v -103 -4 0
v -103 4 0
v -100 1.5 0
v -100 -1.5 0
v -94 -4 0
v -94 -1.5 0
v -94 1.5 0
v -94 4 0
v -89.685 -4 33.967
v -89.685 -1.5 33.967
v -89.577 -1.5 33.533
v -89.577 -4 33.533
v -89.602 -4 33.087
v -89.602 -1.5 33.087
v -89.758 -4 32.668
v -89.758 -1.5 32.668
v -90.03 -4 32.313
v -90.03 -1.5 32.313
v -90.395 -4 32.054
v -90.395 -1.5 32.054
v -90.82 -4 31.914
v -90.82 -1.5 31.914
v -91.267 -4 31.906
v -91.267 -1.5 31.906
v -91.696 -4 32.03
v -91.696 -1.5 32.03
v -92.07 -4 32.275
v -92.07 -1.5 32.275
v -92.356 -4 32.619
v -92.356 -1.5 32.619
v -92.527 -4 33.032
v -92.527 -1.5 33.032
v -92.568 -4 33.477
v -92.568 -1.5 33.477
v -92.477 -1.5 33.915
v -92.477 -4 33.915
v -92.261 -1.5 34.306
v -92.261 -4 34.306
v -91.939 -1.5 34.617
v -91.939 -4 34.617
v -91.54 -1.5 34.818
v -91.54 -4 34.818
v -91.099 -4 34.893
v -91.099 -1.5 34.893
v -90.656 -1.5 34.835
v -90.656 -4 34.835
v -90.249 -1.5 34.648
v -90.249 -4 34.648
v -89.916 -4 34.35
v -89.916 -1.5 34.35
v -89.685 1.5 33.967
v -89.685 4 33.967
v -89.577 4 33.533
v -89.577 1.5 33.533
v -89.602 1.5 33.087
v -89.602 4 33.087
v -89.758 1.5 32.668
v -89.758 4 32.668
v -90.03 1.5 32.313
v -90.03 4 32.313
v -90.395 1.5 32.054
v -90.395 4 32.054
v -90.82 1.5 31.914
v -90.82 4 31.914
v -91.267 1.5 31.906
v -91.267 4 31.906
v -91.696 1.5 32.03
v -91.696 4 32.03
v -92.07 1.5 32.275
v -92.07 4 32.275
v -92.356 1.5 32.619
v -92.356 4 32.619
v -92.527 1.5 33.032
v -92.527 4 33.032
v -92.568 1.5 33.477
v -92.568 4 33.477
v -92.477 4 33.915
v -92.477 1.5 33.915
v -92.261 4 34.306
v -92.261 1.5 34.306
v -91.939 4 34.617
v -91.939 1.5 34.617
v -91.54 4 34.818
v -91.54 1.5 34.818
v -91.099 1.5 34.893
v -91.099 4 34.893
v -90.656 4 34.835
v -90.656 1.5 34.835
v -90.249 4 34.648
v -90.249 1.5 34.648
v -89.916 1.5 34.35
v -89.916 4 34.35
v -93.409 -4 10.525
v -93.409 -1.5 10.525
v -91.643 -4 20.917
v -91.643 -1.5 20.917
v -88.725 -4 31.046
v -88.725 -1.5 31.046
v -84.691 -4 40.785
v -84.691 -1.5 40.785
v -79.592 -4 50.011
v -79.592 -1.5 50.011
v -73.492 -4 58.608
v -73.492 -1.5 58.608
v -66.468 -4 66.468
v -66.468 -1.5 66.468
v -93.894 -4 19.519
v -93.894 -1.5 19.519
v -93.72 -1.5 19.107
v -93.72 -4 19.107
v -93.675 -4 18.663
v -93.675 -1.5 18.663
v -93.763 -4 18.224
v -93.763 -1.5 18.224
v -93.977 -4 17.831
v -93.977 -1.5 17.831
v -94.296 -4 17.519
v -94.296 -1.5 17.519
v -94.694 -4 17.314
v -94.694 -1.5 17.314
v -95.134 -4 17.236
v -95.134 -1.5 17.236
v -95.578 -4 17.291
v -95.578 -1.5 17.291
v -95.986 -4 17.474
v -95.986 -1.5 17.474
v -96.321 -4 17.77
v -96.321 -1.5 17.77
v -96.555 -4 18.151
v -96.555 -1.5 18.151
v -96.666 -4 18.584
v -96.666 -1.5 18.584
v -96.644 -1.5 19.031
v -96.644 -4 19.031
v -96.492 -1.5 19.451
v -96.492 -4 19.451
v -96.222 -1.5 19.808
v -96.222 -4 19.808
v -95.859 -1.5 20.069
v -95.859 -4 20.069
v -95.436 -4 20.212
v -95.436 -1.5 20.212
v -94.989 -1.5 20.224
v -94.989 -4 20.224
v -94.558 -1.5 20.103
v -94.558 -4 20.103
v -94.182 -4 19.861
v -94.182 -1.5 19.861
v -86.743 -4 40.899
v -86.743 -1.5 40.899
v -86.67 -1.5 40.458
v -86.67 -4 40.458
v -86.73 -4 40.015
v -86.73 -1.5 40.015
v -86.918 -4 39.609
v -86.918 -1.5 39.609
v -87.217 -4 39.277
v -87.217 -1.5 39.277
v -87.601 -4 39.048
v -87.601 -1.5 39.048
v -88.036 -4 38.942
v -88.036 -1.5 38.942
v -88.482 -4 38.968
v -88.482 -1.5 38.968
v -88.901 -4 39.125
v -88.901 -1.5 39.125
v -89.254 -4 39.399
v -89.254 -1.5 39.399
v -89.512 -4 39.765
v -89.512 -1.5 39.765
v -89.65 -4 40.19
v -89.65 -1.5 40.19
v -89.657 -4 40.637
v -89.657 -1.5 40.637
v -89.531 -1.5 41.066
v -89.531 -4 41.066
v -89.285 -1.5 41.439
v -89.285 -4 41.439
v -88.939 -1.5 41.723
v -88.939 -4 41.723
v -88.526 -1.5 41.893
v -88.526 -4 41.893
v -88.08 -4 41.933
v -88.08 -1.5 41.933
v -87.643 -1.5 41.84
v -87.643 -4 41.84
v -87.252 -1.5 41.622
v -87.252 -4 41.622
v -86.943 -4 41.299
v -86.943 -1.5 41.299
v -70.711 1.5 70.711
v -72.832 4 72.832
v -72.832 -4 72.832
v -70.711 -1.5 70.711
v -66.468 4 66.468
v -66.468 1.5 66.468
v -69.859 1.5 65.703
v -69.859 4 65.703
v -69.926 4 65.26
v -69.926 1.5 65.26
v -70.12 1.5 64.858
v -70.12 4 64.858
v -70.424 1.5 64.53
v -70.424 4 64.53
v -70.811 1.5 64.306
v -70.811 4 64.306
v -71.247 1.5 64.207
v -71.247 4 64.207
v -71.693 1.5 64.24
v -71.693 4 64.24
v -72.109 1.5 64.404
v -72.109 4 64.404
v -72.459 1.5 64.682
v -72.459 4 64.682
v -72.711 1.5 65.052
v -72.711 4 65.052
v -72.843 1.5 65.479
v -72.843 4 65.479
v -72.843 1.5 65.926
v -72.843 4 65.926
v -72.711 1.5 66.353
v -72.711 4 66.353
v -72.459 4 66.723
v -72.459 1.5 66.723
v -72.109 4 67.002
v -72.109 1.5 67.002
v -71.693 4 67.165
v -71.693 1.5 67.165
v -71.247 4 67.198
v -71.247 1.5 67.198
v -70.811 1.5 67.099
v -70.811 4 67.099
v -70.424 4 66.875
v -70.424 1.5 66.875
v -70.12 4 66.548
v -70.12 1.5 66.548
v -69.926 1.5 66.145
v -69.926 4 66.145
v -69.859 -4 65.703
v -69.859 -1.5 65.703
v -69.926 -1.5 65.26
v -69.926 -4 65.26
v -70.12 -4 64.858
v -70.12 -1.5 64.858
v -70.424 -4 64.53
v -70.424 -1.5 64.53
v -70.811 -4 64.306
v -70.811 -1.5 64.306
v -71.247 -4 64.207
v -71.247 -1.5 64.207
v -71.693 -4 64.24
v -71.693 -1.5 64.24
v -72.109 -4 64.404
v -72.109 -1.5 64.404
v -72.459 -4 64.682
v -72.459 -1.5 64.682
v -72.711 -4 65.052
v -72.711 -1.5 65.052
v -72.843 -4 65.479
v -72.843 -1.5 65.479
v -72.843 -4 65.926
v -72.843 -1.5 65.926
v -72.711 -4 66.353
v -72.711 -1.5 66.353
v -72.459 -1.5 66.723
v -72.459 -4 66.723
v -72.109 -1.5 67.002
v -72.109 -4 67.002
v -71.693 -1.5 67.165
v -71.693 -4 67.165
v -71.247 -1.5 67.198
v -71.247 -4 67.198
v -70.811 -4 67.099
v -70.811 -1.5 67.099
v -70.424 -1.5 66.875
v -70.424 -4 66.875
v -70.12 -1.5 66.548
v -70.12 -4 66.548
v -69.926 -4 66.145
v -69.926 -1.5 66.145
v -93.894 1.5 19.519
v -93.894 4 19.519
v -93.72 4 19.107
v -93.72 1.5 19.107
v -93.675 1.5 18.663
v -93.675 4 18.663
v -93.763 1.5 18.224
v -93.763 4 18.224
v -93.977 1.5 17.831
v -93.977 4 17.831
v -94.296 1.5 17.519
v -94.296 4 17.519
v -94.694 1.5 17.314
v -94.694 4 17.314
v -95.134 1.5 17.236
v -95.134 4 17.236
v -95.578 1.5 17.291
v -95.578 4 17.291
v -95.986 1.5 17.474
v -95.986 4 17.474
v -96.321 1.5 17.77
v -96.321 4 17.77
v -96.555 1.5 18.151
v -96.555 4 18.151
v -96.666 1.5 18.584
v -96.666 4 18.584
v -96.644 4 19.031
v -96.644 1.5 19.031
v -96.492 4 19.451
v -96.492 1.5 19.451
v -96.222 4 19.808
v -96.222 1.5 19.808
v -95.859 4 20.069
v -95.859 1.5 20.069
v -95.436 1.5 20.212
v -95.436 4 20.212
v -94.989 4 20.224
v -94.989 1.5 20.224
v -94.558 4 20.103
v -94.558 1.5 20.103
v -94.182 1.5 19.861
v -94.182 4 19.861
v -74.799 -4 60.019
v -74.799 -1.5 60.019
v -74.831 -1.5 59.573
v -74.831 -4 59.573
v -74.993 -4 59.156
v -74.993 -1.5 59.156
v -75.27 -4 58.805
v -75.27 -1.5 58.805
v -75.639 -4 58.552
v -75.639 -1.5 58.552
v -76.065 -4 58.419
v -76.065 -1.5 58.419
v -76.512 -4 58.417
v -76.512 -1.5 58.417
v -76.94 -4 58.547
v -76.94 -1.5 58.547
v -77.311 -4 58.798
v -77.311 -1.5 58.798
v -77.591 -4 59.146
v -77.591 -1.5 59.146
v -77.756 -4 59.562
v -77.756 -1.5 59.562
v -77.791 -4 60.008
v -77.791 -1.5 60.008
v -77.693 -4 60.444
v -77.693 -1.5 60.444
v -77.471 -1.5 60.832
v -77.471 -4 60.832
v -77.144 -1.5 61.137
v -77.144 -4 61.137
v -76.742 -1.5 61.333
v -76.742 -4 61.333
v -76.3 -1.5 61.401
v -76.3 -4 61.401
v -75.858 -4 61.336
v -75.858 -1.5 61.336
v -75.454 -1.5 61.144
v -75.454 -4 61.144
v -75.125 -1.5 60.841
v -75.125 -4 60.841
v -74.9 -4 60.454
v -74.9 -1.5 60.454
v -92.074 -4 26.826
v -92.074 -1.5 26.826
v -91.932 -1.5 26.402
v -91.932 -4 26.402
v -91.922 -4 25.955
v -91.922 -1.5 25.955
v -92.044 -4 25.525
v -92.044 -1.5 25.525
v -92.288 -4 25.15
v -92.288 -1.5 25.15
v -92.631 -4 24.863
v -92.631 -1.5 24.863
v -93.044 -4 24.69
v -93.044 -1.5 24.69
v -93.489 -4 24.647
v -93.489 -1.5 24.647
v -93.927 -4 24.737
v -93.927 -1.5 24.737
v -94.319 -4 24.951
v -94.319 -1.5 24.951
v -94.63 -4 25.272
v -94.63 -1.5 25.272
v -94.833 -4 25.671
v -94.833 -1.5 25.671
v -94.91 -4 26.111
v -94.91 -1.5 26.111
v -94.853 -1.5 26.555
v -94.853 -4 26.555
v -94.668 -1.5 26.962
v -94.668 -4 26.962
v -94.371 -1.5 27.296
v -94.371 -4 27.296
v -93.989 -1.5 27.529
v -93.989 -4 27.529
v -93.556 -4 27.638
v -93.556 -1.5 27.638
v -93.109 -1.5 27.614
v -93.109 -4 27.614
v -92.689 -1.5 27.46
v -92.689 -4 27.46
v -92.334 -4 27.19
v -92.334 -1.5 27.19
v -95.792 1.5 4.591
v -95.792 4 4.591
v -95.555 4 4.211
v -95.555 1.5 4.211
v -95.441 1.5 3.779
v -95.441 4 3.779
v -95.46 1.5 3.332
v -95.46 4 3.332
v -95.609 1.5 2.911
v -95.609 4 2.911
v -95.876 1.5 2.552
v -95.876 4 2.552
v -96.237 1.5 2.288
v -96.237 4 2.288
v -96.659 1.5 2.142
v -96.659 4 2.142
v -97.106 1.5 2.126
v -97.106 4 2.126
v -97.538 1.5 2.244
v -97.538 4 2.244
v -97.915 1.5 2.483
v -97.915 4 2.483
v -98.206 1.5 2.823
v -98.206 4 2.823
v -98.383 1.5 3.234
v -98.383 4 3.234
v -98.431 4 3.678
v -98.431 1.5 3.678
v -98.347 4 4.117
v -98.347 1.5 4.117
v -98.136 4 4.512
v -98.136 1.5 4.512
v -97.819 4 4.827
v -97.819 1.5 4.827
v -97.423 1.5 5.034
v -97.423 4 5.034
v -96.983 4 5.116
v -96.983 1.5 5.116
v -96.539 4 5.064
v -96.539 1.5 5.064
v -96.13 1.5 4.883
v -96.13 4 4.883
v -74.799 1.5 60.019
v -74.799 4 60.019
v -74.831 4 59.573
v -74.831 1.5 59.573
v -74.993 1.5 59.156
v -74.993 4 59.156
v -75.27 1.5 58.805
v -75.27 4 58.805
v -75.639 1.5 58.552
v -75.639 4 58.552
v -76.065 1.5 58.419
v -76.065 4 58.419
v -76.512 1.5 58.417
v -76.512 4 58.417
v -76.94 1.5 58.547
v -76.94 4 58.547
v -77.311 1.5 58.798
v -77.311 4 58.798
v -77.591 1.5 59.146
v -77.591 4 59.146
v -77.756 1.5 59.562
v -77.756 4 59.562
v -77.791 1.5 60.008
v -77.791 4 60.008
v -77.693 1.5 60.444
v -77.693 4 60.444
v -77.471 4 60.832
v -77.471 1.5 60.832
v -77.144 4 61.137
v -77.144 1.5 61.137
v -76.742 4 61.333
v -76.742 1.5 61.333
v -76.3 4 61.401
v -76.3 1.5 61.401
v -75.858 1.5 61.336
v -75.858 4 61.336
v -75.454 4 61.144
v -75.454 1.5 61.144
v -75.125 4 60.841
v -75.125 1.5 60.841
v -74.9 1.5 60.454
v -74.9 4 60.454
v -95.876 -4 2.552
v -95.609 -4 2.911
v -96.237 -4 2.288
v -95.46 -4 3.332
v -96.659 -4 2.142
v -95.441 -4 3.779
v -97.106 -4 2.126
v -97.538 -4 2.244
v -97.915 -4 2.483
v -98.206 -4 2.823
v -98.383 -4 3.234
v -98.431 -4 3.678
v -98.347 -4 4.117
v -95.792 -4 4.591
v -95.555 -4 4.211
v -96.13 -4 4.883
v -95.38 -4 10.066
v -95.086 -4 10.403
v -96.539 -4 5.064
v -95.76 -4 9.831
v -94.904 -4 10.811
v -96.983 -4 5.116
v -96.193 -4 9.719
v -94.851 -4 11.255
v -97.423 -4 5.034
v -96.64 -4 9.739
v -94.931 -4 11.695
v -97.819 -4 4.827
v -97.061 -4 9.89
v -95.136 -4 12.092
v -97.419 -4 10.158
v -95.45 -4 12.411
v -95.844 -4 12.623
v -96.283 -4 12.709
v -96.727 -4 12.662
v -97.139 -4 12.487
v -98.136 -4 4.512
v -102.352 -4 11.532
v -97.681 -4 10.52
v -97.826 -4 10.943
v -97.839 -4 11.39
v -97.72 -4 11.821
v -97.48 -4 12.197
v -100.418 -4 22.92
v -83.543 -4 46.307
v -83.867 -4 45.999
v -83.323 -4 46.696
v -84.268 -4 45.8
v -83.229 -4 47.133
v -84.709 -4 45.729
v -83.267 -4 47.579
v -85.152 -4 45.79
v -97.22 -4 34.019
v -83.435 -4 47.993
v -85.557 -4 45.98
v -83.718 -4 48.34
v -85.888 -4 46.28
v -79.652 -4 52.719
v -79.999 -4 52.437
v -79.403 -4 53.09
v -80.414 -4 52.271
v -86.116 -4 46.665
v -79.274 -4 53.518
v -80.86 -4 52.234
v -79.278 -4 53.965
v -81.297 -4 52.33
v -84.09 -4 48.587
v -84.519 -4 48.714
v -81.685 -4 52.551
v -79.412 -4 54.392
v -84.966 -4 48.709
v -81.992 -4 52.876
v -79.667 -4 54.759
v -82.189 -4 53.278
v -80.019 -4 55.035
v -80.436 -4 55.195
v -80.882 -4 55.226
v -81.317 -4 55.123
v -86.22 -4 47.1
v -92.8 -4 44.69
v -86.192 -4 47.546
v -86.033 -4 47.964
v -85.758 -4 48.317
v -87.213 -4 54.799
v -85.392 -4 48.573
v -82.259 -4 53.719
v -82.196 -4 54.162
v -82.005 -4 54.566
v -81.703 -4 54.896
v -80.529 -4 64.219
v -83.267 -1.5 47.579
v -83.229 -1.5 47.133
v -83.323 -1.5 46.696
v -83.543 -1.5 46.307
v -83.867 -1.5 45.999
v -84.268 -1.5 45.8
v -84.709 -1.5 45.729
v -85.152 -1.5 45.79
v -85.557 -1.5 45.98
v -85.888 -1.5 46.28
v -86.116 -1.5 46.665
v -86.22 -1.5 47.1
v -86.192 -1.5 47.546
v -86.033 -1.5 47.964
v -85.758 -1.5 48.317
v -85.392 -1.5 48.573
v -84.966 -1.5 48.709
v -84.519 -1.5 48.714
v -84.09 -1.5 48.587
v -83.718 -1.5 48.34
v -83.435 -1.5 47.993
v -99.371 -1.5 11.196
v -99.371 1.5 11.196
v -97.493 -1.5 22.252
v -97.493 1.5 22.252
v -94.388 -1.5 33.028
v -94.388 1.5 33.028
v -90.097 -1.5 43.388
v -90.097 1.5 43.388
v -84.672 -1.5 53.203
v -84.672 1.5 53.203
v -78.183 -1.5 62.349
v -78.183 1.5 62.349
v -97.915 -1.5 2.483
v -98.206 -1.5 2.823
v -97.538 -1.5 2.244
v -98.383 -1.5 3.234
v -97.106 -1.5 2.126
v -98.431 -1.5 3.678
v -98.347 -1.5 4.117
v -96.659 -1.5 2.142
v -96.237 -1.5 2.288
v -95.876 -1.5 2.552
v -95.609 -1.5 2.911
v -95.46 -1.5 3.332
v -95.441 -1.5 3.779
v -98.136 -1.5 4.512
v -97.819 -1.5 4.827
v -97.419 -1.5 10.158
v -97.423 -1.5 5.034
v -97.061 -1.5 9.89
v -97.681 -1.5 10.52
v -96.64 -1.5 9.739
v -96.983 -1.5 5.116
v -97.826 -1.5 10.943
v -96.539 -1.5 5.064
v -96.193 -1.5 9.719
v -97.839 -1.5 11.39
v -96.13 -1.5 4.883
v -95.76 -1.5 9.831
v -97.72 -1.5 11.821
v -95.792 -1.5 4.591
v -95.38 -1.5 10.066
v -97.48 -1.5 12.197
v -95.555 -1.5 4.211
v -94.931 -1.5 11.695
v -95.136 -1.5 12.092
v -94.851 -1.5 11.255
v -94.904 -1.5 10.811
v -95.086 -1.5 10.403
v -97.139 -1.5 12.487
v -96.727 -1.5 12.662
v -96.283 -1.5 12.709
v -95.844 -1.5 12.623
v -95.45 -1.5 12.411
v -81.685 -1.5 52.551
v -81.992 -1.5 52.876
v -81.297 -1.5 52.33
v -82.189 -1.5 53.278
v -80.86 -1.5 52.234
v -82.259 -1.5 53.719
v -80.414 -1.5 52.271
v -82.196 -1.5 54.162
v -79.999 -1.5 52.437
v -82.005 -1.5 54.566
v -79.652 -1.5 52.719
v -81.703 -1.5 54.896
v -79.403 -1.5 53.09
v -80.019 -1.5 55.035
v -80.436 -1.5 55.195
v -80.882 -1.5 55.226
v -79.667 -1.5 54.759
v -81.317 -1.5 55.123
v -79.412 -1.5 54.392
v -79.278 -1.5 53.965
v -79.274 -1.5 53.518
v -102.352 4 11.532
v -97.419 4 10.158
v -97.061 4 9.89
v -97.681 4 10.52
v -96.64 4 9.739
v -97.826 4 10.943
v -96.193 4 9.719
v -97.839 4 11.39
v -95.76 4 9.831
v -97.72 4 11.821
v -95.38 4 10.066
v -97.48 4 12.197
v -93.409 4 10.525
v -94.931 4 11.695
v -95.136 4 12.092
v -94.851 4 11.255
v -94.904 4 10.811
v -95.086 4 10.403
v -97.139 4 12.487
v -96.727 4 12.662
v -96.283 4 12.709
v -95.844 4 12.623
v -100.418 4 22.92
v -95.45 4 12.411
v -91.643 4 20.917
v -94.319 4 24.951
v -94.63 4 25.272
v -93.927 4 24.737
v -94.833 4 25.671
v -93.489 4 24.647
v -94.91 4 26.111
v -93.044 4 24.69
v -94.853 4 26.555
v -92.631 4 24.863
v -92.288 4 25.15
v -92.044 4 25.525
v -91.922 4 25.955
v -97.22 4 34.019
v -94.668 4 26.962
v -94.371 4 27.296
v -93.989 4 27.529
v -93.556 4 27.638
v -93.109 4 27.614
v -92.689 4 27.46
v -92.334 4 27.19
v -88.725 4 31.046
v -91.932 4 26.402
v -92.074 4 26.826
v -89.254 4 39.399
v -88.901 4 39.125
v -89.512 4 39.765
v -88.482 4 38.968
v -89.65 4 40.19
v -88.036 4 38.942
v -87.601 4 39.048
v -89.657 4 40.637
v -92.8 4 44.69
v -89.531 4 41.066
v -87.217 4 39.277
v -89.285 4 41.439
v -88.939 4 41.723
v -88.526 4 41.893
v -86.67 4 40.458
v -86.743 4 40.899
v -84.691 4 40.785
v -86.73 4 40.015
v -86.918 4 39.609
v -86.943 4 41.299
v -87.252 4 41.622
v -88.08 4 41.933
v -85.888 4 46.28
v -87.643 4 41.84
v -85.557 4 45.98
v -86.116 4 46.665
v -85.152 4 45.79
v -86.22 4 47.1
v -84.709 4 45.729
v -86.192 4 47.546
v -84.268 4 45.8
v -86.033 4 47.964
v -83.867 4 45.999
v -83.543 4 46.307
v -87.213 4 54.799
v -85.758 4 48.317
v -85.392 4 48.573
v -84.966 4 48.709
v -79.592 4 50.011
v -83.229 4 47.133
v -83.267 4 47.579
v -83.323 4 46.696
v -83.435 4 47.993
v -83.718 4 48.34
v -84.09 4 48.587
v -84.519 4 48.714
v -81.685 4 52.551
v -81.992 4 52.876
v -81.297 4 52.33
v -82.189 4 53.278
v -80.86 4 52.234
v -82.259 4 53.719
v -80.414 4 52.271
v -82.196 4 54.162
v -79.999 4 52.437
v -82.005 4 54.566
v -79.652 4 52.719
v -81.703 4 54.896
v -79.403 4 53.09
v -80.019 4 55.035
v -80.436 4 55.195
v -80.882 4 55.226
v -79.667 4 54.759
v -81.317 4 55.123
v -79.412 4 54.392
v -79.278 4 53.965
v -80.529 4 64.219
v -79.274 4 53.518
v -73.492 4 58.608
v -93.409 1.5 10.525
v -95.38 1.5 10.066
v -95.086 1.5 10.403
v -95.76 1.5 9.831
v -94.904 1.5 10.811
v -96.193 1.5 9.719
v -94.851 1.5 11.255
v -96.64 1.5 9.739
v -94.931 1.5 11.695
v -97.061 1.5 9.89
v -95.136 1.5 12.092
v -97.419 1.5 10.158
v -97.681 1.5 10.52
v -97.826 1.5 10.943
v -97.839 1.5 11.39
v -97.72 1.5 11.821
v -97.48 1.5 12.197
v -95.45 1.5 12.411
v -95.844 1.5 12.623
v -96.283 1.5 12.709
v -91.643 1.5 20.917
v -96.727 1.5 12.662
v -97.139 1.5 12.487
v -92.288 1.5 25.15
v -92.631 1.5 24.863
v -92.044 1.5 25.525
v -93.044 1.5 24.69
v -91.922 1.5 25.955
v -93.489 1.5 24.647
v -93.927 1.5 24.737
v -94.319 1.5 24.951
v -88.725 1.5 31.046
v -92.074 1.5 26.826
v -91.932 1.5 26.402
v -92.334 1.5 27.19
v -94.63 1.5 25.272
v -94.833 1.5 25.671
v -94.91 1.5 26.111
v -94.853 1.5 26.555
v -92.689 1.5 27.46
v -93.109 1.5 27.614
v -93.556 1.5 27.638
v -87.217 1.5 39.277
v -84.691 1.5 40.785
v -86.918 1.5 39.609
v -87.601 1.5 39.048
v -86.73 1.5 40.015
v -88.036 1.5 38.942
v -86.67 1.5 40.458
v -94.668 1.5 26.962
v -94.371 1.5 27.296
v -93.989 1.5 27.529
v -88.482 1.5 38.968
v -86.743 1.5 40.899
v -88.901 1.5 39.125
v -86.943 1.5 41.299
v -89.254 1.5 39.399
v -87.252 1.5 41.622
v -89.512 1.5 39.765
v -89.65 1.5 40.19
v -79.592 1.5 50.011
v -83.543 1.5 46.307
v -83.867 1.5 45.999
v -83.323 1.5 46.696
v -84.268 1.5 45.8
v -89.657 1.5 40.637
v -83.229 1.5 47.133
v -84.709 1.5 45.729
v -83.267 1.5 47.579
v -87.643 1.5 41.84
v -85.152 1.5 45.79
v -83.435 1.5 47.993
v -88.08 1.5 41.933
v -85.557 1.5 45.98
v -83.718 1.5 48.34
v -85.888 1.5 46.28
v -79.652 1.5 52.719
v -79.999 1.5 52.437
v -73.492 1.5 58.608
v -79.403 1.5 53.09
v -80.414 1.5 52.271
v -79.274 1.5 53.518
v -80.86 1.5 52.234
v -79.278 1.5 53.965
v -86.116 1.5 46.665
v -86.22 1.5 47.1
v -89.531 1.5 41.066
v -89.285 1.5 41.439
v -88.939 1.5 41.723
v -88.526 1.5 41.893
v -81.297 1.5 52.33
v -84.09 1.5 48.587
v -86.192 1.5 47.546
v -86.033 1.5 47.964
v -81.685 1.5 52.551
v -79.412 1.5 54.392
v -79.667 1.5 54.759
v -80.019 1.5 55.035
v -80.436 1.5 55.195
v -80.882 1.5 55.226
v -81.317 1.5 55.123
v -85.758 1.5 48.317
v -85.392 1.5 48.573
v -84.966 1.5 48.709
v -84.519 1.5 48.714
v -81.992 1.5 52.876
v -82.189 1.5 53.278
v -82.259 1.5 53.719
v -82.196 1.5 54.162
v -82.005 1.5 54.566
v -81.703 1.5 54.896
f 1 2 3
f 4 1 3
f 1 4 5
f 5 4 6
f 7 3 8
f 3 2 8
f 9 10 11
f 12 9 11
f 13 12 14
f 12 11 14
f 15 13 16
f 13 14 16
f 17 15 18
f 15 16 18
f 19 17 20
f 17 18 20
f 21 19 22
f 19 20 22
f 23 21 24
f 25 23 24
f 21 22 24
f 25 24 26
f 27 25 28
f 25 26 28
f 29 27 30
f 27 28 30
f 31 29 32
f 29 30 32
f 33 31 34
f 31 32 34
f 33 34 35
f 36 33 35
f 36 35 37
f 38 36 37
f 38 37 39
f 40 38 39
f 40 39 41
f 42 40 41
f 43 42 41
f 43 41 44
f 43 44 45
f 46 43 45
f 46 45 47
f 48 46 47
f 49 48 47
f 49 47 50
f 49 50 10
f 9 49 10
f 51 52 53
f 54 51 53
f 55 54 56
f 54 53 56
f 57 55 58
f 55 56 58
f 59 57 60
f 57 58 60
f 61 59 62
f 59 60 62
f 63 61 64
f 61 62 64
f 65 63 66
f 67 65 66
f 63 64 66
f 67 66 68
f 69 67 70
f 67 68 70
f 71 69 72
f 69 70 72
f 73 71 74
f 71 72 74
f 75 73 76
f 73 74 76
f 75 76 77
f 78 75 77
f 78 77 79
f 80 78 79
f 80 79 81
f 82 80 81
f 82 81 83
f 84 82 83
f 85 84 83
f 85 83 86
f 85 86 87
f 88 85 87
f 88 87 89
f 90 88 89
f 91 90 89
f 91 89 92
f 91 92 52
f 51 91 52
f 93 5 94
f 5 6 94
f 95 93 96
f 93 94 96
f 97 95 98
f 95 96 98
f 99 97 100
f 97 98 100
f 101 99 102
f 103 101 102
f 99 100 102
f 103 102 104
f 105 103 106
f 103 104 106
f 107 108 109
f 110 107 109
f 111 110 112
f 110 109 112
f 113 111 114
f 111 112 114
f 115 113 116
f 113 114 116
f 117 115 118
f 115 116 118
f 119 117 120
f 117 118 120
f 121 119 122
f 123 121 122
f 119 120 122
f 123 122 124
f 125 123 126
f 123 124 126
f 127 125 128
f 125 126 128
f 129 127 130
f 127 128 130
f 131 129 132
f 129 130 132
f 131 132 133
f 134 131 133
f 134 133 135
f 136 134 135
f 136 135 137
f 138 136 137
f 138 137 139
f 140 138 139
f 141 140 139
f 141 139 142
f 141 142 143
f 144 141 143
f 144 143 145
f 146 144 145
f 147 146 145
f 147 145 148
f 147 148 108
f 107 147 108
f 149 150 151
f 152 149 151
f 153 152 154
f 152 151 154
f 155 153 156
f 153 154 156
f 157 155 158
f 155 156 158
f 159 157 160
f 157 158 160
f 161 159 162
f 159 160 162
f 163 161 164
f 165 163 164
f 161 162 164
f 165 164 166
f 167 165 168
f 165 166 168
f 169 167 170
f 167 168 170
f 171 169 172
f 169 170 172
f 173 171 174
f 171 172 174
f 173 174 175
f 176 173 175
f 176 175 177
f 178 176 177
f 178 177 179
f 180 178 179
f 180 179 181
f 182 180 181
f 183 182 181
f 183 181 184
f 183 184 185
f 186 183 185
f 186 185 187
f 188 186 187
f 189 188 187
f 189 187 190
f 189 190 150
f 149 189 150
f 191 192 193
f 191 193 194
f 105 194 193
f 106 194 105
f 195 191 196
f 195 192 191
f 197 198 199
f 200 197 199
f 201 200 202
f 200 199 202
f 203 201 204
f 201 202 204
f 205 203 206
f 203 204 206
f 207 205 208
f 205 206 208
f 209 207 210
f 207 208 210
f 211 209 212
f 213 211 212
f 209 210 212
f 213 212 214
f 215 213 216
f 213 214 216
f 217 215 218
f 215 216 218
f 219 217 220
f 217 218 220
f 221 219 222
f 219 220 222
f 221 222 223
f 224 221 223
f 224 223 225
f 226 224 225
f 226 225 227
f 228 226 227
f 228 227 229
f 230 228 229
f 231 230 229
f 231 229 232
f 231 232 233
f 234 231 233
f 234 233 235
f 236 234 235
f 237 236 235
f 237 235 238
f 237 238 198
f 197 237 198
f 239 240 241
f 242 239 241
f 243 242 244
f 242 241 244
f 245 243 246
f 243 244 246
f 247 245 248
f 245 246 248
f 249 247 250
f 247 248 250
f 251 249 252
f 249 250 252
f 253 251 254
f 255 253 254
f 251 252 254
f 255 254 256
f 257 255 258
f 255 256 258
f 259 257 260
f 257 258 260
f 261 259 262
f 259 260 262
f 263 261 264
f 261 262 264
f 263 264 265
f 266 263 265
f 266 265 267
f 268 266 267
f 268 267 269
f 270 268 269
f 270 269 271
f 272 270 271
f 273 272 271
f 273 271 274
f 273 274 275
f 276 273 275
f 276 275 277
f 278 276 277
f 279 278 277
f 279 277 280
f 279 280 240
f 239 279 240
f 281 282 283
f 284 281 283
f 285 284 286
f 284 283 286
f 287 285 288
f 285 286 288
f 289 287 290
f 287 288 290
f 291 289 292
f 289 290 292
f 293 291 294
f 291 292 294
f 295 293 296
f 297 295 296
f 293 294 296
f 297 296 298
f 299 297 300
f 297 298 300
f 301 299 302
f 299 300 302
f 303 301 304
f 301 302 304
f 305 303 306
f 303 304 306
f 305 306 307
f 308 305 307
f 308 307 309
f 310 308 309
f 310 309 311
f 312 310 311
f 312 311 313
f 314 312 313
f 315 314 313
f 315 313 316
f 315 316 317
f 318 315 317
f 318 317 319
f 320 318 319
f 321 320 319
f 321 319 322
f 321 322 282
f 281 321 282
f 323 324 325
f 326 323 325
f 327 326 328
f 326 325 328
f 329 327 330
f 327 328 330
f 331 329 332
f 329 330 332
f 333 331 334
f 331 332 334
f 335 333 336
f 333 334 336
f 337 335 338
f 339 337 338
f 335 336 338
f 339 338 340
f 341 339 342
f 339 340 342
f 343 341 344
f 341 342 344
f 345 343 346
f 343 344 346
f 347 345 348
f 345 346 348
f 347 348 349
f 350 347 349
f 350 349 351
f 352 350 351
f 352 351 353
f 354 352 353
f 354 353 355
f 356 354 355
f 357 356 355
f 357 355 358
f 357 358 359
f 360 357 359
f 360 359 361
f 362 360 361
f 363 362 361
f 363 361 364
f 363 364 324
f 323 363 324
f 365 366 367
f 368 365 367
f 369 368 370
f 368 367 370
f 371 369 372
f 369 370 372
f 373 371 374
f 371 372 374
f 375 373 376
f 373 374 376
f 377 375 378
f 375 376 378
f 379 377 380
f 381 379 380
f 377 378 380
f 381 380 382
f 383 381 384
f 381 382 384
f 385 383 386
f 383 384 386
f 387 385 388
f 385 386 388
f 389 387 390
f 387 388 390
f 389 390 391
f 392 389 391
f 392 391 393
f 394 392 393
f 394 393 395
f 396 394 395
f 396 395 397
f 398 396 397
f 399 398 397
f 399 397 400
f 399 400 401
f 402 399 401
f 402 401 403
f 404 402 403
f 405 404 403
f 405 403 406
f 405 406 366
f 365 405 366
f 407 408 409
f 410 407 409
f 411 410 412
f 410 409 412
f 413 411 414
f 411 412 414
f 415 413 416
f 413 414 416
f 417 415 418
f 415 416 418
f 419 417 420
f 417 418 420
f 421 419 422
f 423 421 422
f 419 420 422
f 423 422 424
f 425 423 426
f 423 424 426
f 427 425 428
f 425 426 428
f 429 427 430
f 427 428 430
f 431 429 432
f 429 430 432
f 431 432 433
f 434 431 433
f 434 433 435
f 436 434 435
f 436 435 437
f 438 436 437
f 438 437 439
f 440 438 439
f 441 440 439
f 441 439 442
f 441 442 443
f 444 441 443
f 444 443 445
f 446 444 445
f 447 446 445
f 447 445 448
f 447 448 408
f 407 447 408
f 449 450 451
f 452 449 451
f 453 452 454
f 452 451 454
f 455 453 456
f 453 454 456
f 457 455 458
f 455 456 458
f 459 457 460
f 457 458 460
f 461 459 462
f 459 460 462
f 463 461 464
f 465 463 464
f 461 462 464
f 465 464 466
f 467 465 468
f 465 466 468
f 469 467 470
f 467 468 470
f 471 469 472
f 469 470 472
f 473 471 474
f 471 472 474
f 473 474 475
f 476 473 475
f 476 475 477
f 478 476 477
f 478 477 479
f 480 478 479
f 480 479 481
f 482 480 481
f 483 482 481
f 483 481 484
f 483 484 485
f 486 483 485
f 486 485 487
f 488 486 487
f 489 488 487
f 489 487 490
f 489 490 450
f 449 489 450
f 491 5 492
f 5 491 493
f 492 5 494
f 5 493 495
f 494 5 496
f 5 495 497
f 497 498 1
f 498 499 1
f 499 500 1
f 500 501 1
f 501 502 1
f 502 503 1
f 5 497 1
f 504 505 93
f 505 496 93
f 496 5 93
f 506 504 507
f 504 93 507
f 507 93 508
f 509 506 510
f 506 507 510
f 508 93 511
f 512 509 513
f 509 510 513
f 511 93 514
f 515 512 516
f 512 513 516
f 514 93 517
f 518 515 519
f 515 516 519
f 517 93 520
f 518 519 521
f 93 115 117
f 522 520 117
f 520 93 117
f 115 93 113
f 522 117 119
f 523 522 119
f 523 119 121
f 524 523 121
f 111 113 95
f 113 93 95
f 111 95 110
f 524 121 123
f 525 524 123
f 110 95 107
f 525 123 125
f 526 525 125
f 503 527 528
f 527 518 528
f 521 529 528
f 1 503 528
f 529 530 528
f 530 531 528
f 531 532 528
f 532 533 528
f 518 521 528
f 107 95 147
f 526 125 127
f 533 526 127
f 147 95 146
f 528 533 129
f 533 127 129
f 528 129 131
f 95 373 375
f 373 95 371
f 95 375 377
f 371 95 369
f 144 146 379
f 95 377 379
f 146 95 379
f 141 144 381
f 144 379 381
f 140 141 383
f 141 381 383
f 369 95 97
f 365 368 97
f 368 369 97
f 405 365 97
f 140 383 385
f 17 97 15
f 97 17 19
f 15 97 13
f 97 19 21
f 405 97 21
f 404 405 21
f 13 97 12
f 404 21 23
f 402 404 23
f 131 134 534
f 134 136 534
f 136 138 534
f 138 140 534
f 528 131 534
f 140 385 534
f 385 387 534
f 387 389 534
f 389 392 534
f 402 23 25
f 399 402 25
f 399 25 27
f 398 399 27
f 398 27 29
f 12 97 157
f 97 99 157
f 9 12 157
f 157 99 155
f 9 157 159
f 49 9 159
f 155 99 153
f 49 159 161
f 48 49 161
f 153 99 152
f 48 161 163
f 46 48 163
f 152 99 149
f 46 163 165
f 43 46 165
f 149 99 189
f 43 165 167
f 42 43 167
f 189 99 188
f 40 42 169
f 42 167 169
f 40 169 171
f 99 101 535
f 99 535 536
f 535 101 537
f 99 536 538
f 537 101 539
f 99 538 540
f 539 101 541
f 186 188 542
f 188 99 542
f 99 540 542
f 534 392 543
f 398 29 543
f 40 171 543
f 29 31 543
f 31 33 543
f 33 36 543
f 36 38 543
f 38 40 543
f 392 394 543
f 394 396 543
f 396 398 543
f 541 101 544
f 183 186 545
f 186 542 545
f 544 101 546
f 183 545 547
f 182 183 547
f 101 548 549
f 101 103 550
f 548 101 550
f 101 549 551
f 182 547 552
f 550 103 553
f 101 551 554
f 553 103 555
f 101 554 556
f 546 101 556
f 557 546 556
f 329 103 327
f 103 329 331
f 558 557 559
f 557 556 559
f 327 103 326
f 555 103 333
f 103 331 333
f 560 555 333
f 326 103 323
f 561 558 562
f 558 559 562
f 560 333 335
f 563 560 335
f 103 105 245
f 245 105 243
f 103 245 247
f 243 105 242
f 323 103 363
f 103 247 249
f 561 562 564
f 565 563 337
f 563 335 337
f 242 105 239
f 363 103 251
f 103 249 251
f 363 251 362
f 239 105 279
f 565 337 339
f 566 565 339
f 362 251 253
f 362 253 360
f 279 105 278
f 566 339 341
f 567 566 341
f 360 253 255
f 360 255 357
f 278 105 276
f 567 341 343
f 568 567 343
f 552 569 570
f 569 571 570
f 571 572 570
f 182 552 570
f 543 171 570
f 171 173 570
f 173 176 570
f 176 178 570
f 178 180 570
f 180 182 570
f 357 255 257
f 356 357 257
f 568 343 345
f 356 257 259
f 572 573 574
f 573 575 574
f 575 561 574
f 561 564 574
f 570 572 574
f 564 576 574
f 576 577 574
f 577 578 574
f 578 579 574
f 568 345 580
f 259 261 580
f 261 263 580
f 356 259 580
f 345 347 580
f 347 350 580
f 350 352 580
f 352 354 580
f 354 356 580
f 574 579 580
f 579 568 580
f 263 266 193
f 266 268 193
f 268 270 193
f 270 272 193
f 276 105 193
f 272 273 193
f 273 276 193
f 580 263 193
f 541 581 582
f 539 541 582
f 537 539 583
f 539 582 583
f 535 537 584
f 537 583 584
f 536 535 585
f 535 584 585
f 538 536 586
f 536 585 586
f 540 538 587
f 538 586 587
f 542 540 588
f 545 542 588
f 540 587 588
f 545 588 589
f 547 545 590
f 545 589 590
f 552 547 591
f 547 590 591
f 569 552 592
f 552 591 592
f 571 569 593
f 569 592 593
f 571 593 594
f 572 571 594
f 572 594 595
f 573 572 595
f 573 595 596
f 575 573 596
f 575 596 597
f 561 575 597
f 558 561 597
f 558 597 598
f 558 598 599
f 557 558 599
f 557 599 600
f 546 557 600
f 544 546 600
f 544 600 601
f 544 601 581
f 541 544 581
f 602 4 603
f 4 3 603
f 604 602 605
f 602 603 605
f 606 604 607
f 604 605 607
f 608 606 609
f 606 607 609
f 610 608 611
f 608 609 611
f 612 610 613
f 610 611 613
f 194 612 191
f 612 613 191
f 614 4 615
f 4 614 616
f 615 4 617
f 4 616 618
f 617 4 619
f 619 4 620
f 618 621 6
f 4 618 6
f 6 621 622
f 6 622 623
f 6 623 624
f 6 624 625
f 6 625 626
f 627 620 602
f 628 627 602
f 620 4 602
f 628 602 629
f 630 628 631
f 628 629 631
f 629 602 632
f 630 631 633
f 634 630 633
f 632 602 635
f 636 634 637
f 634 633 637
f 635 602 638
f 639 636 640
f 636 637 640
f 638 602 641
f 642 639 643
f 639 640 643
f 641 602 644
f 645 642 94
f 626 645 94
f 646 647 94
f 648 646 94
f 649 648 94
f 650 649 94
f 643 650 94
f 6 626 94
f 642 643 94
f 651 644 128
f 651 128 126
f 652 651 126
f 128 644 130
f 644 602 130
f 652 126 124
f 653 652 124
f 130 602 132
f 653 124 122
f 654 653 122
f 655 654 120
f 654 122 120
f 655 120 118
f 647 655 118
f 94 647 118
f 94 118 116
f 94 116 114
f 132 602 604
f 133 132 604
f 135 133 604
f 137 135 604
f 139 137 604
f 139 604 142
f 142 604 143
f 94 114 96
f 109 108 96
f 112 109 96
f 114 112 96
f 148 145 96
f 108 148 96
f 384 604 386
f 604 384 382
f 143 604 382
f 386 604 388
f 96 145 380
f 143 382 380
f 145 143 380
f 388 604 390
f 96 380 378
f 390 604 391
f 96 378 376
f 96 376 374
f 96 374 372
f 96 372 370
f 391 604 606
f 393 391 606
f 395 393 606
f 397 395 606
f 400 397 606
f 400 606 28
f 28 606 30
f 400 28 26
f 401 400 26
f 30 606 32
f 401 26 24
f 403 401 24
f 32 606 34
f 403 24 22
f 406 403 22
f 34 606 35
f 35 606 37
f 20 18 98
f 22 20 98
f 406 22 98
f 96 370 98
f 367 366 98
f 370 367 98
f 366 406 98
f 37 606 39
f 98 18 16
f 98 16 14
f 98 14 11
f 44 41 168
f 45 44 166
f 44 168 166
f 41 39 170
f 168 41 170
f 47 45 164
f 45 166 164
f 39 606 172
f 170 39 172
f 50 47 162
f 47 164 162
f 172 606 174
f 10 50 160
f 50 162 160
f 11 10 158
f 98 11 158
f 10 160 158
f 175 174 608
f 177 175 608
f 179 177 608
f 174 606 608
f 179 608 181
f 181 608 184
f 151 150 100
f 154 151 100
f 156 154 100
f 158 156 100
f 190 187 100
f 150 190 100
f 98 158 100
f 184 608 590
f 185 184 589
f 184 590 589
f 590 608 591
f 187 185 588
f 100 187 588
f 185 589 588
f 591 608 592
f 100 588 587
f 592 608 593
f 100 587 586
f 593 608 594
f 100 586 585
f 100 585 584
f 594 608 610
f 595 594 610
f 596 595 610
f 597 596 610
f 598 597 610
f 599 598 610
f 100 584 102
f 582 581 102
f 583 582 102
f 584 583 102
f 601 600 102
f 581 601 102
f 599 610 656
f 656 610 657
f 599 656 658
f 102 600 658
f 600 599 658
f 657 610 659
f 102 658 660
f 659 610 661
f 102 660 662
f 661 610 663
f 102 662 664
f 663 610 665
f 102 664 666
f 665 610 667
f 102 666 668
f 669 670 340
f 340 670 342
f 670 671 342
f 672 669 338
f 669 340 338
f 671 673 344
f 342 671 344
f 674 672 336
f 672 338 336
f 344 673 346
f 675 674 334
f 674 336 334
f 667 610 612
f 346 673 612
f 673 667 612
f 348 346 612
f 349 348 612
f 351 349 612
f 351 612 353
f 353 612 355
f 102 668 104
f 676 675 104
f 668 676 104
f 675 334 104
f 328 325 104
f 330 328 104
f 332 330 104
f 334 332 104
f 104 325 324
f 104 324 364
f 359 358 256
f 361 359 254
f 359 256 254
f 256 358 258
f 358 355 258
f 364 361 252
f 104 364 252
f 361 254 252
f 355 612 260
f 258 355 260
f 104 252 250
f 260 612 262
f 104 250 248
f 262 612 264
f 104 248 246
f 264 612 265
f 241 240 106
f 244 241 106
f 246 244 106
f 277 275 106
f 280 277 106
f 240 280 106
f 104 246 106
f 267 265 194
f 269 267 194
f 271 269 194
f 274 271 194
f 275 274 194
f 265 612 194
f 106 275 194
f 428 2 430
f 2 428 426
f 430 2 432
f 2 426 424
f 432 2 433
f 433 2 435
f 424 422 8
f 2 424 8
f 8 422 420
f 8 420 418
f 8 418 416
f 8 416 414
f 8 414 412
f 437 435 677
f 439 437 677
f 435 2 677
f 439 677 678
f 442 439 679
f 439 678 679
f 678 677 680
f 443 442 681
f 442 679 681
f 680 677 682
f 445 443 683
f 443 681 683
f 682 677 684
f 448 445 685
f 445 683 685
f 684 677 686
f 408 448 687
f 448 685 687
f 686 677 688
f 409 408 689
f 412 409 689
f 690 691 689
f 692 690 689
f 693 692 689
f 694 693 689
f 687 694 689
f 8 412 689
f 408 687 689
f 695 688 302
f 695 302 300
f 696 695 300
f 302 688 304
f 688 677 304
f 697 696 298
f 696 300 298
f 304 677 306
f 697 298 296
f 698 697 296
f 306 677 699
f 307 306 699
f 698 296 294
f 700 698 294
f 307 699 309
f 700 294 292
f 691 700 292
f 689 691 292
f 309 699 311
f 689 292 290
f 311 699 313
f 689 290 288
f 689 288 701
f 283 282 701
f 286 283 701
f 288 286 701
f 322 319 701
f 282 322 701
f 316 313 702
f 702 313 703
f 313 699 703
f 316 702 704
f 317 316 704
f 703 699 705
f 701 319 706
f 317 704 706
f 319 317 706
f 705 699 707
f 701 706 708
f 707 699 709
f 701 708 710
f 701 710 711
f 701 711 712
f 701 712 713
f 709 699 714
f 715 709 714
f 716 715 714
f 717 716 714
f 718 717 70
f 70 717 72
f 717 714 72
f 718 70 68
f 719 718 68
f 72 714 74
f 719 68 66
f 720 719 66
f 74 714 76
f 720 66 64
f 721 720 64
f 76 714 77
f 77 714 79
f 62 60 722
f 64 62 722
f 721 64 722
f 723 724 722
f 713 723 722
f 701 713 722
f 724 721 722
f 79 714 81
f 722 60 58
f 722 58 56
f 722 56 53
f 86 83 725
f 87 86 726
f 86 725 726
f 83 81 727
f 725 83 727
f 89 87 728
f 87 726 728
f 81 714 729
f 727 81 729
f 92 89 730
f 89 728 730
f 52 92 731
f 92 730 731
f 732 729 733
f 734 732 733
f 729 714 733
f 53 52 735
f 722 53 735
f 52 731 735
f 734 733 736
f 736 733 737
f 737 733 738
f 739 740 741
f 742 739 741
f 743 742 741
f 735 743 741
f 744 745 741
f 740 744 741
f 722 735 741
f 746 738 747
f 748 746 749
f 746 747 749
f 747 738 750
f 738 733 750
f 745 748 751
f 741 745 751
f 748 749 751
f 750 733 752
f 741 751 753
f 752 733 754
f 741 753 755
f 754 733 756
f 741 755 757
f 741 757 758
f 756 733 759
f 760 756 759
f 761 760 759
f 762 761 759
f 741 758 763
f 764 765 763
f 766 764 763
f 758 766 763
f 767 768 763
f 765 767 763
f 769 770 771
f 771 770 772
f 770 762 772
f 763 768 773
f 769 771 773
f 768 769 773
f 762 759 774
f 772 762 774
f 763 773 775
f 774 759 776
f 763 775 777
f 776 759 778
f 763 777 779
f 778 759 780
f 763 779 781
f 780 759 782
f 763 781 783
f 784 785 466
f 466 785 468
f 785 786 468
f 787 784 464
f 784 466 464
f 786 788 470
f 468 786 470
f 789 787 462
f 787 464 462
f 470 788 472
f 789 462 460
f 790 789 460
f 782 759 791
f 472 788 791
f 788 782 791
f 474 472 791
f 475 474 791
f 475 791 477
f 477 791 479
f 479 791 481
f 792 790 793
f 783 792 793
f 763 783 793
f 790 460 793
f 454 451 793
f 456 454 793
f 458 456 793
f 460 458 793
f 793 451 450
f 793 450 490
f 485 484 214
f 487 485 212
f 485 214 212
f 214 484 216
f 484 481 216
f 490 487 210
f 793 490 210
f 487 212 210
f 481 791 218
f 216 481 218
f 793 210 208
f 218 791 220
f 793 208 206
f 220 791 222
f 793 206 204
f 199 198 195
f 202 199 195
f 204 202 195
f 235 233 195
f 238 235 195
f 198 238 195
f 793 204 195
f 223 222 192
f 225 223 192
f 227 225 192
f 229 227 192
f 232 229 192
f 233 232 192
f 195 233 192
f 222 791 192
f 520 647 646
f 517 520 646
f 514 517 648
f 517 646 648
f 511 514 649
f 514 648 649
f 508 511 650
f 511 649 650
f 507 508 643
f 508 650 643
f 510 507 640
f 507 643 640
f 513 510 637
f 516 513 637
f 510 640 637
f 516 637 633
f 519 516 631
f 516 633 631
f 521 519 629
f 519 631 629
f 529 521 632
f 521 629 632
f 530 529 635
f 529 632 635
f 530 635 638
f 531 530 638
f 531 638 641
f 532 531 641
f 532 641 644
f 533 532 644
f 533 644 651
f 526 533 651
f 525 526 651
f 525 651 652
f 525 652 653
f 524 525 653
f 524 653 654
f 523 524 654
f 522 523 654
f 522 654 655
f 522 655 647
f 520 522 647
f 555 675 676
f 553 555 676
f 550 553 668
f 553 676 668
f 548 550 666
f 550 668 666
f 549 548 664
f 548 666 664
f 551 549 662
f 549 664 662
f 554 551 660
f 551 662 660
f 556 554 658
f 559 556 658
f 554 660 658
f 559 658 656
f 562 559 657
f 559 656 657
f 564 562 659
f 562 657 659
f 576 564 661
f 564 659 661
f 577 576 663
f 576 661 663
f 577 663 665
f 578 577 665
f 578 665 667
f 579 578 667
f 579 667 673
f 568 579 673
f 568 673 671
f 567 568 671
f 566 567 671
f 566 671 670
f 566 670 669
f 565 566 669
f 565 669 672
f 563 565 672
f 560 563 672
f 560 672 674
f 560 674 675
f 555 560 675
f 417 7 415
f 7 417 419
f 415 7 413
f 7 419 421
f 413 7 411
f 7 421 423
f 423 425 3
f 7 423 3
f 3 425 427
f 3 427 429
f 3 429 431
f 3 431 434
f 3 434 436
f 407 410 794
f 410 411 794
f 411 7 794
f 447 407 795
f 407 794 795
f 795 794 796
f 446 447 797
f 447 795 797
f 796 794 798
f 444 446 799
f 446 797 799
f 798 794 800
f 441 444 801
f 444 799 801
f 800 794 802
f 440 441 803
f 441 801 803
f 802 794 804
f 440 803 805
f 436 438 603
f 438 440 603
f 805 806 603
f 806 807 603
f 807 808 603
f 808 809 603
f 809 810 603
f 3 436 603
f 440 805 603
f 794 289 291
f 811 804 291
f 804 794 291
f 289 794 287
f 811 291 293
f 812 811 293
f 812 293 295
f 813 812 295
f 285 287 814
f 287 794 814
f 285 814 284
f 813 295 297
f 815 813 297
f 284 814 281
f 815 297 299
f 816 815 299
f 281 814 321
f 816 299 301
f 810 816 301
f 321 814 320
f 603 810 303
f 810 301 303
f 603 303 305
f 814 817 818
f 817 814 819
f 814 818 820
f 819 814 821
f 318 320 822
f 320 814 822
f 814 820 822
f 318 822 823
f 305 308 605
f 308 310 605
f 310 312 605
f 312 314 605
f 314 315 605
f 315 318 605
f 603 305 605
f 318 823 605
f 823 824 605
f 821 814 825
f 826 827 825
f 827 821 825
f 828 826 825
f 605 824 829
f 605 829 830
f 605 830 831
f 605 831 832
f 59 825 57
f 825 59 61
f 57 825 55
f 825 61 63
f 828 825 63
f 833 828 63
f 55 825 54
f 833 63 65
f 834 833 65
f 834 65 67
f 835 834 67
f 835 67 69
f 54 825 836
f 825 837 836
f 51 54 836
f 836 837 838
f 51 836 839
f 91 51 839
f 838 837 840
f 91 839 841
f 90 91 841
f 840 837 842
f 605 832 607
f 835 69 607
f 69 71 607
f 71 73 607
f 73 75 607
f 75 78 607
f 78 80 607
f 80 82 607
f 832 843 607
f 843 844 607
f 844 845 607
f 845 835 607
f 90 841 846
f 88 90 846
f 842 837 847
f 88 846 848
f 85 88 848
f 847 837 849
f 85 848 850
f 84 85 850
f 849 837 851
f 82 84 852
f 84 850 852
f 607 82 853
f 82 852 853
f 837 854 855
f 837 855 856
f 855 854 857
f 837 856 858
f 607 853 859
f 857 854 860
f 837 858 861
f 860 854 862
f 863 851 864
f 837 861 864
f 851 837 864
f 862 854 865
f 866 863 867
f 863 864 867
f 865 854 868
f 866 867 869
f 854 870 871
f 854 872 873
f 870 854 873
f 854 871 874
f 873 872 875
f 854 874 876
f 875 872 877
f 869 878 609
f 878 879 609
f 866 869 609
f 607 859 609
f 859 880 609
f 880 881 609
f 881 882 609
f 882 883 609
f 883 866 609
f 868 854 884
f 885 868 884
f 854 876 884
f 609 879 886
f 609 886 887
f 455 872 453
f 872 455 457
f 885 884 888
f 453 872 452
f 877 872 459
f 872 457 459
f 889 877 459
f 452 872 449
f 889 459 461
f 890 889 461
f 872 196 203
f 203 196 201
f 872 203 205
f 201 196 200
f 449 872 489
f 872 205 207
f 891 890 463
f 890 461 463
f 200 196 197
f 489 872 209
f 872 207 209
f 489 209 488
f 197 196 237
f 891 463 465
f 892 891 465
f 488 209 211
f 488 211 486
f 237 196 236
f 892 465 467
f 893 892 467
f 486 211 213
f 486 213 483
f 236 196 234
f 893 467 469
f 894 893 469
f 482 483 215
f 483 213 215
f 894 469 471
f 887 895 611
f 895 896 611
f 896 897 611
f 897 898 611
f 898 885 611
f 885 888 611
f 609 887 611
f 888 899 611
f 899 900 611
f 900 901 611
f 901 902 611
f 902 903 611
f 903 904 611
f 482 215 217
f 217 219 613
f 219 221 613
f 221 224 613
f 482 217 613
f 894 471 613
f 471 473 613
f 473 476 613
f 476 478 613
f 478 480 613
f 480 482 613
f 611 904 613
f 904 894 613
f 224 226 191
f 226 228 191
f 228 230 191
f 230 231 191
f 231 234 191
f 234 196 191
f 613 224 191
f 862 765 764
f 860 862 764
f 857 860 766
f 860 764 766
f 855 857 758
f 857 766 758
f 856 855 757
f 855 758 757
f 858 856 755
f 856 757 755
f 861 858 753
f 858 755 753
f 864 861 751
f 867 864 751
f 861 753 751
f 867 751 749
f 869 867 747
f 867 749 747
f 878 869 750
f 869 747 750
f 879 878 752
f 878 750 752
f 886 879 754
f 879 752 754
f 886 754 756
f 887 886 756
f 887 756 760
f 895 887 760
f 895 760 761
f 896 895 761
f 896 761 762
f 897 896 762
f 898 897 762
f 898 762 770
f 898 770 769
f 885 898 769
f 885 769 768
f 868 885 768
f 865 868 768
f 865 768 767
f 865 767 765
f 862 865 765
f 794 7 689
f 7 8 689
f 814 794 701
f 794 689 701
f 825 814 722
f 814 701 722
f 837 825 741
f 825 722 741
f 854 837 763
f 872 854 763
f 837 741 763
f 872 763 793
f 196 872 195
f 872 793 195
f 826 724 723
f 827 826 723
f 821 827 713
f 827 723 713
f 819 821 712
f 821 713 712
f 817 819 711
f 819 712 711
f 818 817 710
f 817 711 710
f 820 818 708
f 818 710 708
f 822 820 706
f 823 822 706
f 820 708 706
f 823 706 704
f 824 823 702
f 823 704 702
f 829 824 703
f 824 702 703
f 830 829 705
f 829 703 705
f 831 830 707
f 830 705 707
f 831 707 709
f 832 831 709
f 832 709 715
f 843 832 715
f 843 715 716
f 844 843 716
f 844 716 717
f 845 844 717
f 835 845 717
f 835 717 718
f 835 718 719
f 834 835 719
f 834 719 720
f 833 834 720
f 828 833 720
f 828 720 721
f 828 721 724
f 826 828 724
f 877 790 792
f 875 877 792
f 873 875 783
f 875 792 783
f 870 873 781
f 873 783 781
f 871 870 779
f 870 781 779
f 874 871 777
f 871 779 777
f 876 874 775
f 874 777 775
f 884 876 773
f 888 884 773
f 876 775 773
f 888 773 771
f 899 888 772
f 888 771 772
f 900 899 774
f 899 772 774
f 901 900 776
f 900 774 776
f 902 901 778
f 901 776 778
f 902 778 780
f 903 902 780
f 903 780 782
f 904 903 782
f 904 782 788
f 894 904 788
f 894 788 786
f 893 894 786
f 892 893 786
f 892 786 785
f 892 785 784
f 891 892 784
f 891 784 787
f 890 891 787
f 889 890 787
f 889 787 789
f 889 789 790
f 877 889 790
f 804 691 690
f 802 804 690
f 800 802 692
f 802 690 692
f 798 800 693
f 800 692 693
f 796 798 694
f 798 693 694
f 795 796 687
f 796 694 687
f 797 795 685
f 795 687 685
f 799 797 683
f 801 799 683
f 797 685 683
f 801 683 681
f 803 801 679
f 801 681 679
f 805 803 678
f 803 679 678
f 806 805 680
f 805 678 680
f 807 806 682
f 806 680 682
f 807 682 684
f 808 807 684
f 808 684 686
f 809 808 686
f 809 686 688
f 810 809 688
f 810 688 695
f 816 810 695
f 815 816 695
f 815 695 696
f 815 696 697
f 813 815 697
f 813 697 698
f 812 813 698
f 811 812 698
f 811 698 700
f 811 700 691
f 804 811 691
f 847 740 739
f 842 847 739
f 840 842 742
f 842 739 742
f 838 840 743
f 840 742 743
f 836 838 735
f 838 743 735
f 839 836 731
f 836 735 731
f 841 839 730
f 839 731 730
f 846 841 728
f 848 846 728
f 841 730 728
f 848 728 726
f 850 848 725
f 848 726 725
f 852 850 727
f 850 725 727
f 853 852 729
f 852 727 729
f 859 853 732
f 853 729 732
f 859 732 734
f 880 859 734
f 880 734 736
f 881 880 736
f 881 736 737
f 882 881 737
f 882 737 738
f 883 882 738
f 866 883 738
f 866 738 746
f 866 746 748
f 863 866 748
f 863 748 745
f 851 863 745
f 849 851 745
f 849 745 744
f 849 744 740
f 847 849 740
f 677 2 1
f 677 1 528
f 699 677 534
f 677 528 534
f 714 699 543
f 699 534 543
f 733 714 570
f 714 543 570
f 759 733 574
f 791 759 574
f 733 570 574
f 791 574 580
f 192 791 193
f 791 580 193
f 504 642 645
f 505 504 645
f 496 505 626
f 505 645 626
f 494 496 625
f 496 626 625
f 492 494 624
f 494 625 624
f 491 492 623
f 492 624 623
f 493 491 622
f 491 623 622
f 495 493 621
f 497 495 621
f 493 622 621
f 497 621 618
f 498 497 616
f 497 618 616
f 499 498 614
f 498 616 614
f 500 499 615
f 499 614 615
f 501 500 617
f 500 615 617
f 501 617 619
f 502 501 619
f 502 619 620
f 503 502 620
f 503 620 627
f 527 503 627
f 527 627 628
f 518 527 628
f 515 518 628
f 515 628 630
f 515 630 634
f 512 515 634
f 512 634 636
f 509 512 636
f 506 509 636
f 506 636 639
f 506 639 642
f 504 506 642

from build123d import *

# Parameters (mm, degrees)
R_VOLUTION1_ANGLE            = 45
ESQUISSE3_R                  = 1.5
ENL_V_MAT_EXTRU_1_DEPTH      = 9
R_P_TITION_CIRCULAIRE1_COUNT = 10
R_P_TITION_CIRCULAIRE1_ANGLE = 40.5


with BuildPart() as part:
    # Esquisse2 → Révolution1 (revolve)
    with BuildSketch(Plane.XY):
        Polygon((-103, 4), (-103, -4), (-94, -4), (-94, -1.5), (-100, -1.5), (-100, 1.5), (-94, 1.5), (-94, 4), align=None)
    revolve(axis=Axis((0, -55, 0), (0, 1, 0)), revolution_arc=R_VOLUTION1_ANGLE)

    # Esquisse3 → Enlèv. mat.-Extru.1 (cut, through all)
    with BuildSketch(Plane(origin=(0, 4, 0), x_dir=(1, 0, 0), z_dir=(0, 1, 0))):
        with Locations((-71.359442001, -65.702587752)):
            Circle(ESQUISSE3_R)
    enl_v_mat_extru_1 = extrude(amount=-ENL_V_MAT_EXTRU_1_DEPTH, mode=Mode.SUBTRACT)

    # Répétition circulaire1: Enlèv. mat.-Extru.1 ×10 about axis
    r_p_tition_circulaire1_axis = Axis((0, 0, 0), (0, -1, 0))
    for i in range(1, R_P_TITION_CIRCULAIRE1_COUNT):
        add(enl_v_mat_extru_1.rotate(r_p_tition_circulaire1_axis, i * R_P_TITION_CIRCULAIRE1_ANGLE / (R_P_TITION_CIRCULAIRE1_COUNT - 1)), mode=Mode.SUBTRACT)


solid = part.part
